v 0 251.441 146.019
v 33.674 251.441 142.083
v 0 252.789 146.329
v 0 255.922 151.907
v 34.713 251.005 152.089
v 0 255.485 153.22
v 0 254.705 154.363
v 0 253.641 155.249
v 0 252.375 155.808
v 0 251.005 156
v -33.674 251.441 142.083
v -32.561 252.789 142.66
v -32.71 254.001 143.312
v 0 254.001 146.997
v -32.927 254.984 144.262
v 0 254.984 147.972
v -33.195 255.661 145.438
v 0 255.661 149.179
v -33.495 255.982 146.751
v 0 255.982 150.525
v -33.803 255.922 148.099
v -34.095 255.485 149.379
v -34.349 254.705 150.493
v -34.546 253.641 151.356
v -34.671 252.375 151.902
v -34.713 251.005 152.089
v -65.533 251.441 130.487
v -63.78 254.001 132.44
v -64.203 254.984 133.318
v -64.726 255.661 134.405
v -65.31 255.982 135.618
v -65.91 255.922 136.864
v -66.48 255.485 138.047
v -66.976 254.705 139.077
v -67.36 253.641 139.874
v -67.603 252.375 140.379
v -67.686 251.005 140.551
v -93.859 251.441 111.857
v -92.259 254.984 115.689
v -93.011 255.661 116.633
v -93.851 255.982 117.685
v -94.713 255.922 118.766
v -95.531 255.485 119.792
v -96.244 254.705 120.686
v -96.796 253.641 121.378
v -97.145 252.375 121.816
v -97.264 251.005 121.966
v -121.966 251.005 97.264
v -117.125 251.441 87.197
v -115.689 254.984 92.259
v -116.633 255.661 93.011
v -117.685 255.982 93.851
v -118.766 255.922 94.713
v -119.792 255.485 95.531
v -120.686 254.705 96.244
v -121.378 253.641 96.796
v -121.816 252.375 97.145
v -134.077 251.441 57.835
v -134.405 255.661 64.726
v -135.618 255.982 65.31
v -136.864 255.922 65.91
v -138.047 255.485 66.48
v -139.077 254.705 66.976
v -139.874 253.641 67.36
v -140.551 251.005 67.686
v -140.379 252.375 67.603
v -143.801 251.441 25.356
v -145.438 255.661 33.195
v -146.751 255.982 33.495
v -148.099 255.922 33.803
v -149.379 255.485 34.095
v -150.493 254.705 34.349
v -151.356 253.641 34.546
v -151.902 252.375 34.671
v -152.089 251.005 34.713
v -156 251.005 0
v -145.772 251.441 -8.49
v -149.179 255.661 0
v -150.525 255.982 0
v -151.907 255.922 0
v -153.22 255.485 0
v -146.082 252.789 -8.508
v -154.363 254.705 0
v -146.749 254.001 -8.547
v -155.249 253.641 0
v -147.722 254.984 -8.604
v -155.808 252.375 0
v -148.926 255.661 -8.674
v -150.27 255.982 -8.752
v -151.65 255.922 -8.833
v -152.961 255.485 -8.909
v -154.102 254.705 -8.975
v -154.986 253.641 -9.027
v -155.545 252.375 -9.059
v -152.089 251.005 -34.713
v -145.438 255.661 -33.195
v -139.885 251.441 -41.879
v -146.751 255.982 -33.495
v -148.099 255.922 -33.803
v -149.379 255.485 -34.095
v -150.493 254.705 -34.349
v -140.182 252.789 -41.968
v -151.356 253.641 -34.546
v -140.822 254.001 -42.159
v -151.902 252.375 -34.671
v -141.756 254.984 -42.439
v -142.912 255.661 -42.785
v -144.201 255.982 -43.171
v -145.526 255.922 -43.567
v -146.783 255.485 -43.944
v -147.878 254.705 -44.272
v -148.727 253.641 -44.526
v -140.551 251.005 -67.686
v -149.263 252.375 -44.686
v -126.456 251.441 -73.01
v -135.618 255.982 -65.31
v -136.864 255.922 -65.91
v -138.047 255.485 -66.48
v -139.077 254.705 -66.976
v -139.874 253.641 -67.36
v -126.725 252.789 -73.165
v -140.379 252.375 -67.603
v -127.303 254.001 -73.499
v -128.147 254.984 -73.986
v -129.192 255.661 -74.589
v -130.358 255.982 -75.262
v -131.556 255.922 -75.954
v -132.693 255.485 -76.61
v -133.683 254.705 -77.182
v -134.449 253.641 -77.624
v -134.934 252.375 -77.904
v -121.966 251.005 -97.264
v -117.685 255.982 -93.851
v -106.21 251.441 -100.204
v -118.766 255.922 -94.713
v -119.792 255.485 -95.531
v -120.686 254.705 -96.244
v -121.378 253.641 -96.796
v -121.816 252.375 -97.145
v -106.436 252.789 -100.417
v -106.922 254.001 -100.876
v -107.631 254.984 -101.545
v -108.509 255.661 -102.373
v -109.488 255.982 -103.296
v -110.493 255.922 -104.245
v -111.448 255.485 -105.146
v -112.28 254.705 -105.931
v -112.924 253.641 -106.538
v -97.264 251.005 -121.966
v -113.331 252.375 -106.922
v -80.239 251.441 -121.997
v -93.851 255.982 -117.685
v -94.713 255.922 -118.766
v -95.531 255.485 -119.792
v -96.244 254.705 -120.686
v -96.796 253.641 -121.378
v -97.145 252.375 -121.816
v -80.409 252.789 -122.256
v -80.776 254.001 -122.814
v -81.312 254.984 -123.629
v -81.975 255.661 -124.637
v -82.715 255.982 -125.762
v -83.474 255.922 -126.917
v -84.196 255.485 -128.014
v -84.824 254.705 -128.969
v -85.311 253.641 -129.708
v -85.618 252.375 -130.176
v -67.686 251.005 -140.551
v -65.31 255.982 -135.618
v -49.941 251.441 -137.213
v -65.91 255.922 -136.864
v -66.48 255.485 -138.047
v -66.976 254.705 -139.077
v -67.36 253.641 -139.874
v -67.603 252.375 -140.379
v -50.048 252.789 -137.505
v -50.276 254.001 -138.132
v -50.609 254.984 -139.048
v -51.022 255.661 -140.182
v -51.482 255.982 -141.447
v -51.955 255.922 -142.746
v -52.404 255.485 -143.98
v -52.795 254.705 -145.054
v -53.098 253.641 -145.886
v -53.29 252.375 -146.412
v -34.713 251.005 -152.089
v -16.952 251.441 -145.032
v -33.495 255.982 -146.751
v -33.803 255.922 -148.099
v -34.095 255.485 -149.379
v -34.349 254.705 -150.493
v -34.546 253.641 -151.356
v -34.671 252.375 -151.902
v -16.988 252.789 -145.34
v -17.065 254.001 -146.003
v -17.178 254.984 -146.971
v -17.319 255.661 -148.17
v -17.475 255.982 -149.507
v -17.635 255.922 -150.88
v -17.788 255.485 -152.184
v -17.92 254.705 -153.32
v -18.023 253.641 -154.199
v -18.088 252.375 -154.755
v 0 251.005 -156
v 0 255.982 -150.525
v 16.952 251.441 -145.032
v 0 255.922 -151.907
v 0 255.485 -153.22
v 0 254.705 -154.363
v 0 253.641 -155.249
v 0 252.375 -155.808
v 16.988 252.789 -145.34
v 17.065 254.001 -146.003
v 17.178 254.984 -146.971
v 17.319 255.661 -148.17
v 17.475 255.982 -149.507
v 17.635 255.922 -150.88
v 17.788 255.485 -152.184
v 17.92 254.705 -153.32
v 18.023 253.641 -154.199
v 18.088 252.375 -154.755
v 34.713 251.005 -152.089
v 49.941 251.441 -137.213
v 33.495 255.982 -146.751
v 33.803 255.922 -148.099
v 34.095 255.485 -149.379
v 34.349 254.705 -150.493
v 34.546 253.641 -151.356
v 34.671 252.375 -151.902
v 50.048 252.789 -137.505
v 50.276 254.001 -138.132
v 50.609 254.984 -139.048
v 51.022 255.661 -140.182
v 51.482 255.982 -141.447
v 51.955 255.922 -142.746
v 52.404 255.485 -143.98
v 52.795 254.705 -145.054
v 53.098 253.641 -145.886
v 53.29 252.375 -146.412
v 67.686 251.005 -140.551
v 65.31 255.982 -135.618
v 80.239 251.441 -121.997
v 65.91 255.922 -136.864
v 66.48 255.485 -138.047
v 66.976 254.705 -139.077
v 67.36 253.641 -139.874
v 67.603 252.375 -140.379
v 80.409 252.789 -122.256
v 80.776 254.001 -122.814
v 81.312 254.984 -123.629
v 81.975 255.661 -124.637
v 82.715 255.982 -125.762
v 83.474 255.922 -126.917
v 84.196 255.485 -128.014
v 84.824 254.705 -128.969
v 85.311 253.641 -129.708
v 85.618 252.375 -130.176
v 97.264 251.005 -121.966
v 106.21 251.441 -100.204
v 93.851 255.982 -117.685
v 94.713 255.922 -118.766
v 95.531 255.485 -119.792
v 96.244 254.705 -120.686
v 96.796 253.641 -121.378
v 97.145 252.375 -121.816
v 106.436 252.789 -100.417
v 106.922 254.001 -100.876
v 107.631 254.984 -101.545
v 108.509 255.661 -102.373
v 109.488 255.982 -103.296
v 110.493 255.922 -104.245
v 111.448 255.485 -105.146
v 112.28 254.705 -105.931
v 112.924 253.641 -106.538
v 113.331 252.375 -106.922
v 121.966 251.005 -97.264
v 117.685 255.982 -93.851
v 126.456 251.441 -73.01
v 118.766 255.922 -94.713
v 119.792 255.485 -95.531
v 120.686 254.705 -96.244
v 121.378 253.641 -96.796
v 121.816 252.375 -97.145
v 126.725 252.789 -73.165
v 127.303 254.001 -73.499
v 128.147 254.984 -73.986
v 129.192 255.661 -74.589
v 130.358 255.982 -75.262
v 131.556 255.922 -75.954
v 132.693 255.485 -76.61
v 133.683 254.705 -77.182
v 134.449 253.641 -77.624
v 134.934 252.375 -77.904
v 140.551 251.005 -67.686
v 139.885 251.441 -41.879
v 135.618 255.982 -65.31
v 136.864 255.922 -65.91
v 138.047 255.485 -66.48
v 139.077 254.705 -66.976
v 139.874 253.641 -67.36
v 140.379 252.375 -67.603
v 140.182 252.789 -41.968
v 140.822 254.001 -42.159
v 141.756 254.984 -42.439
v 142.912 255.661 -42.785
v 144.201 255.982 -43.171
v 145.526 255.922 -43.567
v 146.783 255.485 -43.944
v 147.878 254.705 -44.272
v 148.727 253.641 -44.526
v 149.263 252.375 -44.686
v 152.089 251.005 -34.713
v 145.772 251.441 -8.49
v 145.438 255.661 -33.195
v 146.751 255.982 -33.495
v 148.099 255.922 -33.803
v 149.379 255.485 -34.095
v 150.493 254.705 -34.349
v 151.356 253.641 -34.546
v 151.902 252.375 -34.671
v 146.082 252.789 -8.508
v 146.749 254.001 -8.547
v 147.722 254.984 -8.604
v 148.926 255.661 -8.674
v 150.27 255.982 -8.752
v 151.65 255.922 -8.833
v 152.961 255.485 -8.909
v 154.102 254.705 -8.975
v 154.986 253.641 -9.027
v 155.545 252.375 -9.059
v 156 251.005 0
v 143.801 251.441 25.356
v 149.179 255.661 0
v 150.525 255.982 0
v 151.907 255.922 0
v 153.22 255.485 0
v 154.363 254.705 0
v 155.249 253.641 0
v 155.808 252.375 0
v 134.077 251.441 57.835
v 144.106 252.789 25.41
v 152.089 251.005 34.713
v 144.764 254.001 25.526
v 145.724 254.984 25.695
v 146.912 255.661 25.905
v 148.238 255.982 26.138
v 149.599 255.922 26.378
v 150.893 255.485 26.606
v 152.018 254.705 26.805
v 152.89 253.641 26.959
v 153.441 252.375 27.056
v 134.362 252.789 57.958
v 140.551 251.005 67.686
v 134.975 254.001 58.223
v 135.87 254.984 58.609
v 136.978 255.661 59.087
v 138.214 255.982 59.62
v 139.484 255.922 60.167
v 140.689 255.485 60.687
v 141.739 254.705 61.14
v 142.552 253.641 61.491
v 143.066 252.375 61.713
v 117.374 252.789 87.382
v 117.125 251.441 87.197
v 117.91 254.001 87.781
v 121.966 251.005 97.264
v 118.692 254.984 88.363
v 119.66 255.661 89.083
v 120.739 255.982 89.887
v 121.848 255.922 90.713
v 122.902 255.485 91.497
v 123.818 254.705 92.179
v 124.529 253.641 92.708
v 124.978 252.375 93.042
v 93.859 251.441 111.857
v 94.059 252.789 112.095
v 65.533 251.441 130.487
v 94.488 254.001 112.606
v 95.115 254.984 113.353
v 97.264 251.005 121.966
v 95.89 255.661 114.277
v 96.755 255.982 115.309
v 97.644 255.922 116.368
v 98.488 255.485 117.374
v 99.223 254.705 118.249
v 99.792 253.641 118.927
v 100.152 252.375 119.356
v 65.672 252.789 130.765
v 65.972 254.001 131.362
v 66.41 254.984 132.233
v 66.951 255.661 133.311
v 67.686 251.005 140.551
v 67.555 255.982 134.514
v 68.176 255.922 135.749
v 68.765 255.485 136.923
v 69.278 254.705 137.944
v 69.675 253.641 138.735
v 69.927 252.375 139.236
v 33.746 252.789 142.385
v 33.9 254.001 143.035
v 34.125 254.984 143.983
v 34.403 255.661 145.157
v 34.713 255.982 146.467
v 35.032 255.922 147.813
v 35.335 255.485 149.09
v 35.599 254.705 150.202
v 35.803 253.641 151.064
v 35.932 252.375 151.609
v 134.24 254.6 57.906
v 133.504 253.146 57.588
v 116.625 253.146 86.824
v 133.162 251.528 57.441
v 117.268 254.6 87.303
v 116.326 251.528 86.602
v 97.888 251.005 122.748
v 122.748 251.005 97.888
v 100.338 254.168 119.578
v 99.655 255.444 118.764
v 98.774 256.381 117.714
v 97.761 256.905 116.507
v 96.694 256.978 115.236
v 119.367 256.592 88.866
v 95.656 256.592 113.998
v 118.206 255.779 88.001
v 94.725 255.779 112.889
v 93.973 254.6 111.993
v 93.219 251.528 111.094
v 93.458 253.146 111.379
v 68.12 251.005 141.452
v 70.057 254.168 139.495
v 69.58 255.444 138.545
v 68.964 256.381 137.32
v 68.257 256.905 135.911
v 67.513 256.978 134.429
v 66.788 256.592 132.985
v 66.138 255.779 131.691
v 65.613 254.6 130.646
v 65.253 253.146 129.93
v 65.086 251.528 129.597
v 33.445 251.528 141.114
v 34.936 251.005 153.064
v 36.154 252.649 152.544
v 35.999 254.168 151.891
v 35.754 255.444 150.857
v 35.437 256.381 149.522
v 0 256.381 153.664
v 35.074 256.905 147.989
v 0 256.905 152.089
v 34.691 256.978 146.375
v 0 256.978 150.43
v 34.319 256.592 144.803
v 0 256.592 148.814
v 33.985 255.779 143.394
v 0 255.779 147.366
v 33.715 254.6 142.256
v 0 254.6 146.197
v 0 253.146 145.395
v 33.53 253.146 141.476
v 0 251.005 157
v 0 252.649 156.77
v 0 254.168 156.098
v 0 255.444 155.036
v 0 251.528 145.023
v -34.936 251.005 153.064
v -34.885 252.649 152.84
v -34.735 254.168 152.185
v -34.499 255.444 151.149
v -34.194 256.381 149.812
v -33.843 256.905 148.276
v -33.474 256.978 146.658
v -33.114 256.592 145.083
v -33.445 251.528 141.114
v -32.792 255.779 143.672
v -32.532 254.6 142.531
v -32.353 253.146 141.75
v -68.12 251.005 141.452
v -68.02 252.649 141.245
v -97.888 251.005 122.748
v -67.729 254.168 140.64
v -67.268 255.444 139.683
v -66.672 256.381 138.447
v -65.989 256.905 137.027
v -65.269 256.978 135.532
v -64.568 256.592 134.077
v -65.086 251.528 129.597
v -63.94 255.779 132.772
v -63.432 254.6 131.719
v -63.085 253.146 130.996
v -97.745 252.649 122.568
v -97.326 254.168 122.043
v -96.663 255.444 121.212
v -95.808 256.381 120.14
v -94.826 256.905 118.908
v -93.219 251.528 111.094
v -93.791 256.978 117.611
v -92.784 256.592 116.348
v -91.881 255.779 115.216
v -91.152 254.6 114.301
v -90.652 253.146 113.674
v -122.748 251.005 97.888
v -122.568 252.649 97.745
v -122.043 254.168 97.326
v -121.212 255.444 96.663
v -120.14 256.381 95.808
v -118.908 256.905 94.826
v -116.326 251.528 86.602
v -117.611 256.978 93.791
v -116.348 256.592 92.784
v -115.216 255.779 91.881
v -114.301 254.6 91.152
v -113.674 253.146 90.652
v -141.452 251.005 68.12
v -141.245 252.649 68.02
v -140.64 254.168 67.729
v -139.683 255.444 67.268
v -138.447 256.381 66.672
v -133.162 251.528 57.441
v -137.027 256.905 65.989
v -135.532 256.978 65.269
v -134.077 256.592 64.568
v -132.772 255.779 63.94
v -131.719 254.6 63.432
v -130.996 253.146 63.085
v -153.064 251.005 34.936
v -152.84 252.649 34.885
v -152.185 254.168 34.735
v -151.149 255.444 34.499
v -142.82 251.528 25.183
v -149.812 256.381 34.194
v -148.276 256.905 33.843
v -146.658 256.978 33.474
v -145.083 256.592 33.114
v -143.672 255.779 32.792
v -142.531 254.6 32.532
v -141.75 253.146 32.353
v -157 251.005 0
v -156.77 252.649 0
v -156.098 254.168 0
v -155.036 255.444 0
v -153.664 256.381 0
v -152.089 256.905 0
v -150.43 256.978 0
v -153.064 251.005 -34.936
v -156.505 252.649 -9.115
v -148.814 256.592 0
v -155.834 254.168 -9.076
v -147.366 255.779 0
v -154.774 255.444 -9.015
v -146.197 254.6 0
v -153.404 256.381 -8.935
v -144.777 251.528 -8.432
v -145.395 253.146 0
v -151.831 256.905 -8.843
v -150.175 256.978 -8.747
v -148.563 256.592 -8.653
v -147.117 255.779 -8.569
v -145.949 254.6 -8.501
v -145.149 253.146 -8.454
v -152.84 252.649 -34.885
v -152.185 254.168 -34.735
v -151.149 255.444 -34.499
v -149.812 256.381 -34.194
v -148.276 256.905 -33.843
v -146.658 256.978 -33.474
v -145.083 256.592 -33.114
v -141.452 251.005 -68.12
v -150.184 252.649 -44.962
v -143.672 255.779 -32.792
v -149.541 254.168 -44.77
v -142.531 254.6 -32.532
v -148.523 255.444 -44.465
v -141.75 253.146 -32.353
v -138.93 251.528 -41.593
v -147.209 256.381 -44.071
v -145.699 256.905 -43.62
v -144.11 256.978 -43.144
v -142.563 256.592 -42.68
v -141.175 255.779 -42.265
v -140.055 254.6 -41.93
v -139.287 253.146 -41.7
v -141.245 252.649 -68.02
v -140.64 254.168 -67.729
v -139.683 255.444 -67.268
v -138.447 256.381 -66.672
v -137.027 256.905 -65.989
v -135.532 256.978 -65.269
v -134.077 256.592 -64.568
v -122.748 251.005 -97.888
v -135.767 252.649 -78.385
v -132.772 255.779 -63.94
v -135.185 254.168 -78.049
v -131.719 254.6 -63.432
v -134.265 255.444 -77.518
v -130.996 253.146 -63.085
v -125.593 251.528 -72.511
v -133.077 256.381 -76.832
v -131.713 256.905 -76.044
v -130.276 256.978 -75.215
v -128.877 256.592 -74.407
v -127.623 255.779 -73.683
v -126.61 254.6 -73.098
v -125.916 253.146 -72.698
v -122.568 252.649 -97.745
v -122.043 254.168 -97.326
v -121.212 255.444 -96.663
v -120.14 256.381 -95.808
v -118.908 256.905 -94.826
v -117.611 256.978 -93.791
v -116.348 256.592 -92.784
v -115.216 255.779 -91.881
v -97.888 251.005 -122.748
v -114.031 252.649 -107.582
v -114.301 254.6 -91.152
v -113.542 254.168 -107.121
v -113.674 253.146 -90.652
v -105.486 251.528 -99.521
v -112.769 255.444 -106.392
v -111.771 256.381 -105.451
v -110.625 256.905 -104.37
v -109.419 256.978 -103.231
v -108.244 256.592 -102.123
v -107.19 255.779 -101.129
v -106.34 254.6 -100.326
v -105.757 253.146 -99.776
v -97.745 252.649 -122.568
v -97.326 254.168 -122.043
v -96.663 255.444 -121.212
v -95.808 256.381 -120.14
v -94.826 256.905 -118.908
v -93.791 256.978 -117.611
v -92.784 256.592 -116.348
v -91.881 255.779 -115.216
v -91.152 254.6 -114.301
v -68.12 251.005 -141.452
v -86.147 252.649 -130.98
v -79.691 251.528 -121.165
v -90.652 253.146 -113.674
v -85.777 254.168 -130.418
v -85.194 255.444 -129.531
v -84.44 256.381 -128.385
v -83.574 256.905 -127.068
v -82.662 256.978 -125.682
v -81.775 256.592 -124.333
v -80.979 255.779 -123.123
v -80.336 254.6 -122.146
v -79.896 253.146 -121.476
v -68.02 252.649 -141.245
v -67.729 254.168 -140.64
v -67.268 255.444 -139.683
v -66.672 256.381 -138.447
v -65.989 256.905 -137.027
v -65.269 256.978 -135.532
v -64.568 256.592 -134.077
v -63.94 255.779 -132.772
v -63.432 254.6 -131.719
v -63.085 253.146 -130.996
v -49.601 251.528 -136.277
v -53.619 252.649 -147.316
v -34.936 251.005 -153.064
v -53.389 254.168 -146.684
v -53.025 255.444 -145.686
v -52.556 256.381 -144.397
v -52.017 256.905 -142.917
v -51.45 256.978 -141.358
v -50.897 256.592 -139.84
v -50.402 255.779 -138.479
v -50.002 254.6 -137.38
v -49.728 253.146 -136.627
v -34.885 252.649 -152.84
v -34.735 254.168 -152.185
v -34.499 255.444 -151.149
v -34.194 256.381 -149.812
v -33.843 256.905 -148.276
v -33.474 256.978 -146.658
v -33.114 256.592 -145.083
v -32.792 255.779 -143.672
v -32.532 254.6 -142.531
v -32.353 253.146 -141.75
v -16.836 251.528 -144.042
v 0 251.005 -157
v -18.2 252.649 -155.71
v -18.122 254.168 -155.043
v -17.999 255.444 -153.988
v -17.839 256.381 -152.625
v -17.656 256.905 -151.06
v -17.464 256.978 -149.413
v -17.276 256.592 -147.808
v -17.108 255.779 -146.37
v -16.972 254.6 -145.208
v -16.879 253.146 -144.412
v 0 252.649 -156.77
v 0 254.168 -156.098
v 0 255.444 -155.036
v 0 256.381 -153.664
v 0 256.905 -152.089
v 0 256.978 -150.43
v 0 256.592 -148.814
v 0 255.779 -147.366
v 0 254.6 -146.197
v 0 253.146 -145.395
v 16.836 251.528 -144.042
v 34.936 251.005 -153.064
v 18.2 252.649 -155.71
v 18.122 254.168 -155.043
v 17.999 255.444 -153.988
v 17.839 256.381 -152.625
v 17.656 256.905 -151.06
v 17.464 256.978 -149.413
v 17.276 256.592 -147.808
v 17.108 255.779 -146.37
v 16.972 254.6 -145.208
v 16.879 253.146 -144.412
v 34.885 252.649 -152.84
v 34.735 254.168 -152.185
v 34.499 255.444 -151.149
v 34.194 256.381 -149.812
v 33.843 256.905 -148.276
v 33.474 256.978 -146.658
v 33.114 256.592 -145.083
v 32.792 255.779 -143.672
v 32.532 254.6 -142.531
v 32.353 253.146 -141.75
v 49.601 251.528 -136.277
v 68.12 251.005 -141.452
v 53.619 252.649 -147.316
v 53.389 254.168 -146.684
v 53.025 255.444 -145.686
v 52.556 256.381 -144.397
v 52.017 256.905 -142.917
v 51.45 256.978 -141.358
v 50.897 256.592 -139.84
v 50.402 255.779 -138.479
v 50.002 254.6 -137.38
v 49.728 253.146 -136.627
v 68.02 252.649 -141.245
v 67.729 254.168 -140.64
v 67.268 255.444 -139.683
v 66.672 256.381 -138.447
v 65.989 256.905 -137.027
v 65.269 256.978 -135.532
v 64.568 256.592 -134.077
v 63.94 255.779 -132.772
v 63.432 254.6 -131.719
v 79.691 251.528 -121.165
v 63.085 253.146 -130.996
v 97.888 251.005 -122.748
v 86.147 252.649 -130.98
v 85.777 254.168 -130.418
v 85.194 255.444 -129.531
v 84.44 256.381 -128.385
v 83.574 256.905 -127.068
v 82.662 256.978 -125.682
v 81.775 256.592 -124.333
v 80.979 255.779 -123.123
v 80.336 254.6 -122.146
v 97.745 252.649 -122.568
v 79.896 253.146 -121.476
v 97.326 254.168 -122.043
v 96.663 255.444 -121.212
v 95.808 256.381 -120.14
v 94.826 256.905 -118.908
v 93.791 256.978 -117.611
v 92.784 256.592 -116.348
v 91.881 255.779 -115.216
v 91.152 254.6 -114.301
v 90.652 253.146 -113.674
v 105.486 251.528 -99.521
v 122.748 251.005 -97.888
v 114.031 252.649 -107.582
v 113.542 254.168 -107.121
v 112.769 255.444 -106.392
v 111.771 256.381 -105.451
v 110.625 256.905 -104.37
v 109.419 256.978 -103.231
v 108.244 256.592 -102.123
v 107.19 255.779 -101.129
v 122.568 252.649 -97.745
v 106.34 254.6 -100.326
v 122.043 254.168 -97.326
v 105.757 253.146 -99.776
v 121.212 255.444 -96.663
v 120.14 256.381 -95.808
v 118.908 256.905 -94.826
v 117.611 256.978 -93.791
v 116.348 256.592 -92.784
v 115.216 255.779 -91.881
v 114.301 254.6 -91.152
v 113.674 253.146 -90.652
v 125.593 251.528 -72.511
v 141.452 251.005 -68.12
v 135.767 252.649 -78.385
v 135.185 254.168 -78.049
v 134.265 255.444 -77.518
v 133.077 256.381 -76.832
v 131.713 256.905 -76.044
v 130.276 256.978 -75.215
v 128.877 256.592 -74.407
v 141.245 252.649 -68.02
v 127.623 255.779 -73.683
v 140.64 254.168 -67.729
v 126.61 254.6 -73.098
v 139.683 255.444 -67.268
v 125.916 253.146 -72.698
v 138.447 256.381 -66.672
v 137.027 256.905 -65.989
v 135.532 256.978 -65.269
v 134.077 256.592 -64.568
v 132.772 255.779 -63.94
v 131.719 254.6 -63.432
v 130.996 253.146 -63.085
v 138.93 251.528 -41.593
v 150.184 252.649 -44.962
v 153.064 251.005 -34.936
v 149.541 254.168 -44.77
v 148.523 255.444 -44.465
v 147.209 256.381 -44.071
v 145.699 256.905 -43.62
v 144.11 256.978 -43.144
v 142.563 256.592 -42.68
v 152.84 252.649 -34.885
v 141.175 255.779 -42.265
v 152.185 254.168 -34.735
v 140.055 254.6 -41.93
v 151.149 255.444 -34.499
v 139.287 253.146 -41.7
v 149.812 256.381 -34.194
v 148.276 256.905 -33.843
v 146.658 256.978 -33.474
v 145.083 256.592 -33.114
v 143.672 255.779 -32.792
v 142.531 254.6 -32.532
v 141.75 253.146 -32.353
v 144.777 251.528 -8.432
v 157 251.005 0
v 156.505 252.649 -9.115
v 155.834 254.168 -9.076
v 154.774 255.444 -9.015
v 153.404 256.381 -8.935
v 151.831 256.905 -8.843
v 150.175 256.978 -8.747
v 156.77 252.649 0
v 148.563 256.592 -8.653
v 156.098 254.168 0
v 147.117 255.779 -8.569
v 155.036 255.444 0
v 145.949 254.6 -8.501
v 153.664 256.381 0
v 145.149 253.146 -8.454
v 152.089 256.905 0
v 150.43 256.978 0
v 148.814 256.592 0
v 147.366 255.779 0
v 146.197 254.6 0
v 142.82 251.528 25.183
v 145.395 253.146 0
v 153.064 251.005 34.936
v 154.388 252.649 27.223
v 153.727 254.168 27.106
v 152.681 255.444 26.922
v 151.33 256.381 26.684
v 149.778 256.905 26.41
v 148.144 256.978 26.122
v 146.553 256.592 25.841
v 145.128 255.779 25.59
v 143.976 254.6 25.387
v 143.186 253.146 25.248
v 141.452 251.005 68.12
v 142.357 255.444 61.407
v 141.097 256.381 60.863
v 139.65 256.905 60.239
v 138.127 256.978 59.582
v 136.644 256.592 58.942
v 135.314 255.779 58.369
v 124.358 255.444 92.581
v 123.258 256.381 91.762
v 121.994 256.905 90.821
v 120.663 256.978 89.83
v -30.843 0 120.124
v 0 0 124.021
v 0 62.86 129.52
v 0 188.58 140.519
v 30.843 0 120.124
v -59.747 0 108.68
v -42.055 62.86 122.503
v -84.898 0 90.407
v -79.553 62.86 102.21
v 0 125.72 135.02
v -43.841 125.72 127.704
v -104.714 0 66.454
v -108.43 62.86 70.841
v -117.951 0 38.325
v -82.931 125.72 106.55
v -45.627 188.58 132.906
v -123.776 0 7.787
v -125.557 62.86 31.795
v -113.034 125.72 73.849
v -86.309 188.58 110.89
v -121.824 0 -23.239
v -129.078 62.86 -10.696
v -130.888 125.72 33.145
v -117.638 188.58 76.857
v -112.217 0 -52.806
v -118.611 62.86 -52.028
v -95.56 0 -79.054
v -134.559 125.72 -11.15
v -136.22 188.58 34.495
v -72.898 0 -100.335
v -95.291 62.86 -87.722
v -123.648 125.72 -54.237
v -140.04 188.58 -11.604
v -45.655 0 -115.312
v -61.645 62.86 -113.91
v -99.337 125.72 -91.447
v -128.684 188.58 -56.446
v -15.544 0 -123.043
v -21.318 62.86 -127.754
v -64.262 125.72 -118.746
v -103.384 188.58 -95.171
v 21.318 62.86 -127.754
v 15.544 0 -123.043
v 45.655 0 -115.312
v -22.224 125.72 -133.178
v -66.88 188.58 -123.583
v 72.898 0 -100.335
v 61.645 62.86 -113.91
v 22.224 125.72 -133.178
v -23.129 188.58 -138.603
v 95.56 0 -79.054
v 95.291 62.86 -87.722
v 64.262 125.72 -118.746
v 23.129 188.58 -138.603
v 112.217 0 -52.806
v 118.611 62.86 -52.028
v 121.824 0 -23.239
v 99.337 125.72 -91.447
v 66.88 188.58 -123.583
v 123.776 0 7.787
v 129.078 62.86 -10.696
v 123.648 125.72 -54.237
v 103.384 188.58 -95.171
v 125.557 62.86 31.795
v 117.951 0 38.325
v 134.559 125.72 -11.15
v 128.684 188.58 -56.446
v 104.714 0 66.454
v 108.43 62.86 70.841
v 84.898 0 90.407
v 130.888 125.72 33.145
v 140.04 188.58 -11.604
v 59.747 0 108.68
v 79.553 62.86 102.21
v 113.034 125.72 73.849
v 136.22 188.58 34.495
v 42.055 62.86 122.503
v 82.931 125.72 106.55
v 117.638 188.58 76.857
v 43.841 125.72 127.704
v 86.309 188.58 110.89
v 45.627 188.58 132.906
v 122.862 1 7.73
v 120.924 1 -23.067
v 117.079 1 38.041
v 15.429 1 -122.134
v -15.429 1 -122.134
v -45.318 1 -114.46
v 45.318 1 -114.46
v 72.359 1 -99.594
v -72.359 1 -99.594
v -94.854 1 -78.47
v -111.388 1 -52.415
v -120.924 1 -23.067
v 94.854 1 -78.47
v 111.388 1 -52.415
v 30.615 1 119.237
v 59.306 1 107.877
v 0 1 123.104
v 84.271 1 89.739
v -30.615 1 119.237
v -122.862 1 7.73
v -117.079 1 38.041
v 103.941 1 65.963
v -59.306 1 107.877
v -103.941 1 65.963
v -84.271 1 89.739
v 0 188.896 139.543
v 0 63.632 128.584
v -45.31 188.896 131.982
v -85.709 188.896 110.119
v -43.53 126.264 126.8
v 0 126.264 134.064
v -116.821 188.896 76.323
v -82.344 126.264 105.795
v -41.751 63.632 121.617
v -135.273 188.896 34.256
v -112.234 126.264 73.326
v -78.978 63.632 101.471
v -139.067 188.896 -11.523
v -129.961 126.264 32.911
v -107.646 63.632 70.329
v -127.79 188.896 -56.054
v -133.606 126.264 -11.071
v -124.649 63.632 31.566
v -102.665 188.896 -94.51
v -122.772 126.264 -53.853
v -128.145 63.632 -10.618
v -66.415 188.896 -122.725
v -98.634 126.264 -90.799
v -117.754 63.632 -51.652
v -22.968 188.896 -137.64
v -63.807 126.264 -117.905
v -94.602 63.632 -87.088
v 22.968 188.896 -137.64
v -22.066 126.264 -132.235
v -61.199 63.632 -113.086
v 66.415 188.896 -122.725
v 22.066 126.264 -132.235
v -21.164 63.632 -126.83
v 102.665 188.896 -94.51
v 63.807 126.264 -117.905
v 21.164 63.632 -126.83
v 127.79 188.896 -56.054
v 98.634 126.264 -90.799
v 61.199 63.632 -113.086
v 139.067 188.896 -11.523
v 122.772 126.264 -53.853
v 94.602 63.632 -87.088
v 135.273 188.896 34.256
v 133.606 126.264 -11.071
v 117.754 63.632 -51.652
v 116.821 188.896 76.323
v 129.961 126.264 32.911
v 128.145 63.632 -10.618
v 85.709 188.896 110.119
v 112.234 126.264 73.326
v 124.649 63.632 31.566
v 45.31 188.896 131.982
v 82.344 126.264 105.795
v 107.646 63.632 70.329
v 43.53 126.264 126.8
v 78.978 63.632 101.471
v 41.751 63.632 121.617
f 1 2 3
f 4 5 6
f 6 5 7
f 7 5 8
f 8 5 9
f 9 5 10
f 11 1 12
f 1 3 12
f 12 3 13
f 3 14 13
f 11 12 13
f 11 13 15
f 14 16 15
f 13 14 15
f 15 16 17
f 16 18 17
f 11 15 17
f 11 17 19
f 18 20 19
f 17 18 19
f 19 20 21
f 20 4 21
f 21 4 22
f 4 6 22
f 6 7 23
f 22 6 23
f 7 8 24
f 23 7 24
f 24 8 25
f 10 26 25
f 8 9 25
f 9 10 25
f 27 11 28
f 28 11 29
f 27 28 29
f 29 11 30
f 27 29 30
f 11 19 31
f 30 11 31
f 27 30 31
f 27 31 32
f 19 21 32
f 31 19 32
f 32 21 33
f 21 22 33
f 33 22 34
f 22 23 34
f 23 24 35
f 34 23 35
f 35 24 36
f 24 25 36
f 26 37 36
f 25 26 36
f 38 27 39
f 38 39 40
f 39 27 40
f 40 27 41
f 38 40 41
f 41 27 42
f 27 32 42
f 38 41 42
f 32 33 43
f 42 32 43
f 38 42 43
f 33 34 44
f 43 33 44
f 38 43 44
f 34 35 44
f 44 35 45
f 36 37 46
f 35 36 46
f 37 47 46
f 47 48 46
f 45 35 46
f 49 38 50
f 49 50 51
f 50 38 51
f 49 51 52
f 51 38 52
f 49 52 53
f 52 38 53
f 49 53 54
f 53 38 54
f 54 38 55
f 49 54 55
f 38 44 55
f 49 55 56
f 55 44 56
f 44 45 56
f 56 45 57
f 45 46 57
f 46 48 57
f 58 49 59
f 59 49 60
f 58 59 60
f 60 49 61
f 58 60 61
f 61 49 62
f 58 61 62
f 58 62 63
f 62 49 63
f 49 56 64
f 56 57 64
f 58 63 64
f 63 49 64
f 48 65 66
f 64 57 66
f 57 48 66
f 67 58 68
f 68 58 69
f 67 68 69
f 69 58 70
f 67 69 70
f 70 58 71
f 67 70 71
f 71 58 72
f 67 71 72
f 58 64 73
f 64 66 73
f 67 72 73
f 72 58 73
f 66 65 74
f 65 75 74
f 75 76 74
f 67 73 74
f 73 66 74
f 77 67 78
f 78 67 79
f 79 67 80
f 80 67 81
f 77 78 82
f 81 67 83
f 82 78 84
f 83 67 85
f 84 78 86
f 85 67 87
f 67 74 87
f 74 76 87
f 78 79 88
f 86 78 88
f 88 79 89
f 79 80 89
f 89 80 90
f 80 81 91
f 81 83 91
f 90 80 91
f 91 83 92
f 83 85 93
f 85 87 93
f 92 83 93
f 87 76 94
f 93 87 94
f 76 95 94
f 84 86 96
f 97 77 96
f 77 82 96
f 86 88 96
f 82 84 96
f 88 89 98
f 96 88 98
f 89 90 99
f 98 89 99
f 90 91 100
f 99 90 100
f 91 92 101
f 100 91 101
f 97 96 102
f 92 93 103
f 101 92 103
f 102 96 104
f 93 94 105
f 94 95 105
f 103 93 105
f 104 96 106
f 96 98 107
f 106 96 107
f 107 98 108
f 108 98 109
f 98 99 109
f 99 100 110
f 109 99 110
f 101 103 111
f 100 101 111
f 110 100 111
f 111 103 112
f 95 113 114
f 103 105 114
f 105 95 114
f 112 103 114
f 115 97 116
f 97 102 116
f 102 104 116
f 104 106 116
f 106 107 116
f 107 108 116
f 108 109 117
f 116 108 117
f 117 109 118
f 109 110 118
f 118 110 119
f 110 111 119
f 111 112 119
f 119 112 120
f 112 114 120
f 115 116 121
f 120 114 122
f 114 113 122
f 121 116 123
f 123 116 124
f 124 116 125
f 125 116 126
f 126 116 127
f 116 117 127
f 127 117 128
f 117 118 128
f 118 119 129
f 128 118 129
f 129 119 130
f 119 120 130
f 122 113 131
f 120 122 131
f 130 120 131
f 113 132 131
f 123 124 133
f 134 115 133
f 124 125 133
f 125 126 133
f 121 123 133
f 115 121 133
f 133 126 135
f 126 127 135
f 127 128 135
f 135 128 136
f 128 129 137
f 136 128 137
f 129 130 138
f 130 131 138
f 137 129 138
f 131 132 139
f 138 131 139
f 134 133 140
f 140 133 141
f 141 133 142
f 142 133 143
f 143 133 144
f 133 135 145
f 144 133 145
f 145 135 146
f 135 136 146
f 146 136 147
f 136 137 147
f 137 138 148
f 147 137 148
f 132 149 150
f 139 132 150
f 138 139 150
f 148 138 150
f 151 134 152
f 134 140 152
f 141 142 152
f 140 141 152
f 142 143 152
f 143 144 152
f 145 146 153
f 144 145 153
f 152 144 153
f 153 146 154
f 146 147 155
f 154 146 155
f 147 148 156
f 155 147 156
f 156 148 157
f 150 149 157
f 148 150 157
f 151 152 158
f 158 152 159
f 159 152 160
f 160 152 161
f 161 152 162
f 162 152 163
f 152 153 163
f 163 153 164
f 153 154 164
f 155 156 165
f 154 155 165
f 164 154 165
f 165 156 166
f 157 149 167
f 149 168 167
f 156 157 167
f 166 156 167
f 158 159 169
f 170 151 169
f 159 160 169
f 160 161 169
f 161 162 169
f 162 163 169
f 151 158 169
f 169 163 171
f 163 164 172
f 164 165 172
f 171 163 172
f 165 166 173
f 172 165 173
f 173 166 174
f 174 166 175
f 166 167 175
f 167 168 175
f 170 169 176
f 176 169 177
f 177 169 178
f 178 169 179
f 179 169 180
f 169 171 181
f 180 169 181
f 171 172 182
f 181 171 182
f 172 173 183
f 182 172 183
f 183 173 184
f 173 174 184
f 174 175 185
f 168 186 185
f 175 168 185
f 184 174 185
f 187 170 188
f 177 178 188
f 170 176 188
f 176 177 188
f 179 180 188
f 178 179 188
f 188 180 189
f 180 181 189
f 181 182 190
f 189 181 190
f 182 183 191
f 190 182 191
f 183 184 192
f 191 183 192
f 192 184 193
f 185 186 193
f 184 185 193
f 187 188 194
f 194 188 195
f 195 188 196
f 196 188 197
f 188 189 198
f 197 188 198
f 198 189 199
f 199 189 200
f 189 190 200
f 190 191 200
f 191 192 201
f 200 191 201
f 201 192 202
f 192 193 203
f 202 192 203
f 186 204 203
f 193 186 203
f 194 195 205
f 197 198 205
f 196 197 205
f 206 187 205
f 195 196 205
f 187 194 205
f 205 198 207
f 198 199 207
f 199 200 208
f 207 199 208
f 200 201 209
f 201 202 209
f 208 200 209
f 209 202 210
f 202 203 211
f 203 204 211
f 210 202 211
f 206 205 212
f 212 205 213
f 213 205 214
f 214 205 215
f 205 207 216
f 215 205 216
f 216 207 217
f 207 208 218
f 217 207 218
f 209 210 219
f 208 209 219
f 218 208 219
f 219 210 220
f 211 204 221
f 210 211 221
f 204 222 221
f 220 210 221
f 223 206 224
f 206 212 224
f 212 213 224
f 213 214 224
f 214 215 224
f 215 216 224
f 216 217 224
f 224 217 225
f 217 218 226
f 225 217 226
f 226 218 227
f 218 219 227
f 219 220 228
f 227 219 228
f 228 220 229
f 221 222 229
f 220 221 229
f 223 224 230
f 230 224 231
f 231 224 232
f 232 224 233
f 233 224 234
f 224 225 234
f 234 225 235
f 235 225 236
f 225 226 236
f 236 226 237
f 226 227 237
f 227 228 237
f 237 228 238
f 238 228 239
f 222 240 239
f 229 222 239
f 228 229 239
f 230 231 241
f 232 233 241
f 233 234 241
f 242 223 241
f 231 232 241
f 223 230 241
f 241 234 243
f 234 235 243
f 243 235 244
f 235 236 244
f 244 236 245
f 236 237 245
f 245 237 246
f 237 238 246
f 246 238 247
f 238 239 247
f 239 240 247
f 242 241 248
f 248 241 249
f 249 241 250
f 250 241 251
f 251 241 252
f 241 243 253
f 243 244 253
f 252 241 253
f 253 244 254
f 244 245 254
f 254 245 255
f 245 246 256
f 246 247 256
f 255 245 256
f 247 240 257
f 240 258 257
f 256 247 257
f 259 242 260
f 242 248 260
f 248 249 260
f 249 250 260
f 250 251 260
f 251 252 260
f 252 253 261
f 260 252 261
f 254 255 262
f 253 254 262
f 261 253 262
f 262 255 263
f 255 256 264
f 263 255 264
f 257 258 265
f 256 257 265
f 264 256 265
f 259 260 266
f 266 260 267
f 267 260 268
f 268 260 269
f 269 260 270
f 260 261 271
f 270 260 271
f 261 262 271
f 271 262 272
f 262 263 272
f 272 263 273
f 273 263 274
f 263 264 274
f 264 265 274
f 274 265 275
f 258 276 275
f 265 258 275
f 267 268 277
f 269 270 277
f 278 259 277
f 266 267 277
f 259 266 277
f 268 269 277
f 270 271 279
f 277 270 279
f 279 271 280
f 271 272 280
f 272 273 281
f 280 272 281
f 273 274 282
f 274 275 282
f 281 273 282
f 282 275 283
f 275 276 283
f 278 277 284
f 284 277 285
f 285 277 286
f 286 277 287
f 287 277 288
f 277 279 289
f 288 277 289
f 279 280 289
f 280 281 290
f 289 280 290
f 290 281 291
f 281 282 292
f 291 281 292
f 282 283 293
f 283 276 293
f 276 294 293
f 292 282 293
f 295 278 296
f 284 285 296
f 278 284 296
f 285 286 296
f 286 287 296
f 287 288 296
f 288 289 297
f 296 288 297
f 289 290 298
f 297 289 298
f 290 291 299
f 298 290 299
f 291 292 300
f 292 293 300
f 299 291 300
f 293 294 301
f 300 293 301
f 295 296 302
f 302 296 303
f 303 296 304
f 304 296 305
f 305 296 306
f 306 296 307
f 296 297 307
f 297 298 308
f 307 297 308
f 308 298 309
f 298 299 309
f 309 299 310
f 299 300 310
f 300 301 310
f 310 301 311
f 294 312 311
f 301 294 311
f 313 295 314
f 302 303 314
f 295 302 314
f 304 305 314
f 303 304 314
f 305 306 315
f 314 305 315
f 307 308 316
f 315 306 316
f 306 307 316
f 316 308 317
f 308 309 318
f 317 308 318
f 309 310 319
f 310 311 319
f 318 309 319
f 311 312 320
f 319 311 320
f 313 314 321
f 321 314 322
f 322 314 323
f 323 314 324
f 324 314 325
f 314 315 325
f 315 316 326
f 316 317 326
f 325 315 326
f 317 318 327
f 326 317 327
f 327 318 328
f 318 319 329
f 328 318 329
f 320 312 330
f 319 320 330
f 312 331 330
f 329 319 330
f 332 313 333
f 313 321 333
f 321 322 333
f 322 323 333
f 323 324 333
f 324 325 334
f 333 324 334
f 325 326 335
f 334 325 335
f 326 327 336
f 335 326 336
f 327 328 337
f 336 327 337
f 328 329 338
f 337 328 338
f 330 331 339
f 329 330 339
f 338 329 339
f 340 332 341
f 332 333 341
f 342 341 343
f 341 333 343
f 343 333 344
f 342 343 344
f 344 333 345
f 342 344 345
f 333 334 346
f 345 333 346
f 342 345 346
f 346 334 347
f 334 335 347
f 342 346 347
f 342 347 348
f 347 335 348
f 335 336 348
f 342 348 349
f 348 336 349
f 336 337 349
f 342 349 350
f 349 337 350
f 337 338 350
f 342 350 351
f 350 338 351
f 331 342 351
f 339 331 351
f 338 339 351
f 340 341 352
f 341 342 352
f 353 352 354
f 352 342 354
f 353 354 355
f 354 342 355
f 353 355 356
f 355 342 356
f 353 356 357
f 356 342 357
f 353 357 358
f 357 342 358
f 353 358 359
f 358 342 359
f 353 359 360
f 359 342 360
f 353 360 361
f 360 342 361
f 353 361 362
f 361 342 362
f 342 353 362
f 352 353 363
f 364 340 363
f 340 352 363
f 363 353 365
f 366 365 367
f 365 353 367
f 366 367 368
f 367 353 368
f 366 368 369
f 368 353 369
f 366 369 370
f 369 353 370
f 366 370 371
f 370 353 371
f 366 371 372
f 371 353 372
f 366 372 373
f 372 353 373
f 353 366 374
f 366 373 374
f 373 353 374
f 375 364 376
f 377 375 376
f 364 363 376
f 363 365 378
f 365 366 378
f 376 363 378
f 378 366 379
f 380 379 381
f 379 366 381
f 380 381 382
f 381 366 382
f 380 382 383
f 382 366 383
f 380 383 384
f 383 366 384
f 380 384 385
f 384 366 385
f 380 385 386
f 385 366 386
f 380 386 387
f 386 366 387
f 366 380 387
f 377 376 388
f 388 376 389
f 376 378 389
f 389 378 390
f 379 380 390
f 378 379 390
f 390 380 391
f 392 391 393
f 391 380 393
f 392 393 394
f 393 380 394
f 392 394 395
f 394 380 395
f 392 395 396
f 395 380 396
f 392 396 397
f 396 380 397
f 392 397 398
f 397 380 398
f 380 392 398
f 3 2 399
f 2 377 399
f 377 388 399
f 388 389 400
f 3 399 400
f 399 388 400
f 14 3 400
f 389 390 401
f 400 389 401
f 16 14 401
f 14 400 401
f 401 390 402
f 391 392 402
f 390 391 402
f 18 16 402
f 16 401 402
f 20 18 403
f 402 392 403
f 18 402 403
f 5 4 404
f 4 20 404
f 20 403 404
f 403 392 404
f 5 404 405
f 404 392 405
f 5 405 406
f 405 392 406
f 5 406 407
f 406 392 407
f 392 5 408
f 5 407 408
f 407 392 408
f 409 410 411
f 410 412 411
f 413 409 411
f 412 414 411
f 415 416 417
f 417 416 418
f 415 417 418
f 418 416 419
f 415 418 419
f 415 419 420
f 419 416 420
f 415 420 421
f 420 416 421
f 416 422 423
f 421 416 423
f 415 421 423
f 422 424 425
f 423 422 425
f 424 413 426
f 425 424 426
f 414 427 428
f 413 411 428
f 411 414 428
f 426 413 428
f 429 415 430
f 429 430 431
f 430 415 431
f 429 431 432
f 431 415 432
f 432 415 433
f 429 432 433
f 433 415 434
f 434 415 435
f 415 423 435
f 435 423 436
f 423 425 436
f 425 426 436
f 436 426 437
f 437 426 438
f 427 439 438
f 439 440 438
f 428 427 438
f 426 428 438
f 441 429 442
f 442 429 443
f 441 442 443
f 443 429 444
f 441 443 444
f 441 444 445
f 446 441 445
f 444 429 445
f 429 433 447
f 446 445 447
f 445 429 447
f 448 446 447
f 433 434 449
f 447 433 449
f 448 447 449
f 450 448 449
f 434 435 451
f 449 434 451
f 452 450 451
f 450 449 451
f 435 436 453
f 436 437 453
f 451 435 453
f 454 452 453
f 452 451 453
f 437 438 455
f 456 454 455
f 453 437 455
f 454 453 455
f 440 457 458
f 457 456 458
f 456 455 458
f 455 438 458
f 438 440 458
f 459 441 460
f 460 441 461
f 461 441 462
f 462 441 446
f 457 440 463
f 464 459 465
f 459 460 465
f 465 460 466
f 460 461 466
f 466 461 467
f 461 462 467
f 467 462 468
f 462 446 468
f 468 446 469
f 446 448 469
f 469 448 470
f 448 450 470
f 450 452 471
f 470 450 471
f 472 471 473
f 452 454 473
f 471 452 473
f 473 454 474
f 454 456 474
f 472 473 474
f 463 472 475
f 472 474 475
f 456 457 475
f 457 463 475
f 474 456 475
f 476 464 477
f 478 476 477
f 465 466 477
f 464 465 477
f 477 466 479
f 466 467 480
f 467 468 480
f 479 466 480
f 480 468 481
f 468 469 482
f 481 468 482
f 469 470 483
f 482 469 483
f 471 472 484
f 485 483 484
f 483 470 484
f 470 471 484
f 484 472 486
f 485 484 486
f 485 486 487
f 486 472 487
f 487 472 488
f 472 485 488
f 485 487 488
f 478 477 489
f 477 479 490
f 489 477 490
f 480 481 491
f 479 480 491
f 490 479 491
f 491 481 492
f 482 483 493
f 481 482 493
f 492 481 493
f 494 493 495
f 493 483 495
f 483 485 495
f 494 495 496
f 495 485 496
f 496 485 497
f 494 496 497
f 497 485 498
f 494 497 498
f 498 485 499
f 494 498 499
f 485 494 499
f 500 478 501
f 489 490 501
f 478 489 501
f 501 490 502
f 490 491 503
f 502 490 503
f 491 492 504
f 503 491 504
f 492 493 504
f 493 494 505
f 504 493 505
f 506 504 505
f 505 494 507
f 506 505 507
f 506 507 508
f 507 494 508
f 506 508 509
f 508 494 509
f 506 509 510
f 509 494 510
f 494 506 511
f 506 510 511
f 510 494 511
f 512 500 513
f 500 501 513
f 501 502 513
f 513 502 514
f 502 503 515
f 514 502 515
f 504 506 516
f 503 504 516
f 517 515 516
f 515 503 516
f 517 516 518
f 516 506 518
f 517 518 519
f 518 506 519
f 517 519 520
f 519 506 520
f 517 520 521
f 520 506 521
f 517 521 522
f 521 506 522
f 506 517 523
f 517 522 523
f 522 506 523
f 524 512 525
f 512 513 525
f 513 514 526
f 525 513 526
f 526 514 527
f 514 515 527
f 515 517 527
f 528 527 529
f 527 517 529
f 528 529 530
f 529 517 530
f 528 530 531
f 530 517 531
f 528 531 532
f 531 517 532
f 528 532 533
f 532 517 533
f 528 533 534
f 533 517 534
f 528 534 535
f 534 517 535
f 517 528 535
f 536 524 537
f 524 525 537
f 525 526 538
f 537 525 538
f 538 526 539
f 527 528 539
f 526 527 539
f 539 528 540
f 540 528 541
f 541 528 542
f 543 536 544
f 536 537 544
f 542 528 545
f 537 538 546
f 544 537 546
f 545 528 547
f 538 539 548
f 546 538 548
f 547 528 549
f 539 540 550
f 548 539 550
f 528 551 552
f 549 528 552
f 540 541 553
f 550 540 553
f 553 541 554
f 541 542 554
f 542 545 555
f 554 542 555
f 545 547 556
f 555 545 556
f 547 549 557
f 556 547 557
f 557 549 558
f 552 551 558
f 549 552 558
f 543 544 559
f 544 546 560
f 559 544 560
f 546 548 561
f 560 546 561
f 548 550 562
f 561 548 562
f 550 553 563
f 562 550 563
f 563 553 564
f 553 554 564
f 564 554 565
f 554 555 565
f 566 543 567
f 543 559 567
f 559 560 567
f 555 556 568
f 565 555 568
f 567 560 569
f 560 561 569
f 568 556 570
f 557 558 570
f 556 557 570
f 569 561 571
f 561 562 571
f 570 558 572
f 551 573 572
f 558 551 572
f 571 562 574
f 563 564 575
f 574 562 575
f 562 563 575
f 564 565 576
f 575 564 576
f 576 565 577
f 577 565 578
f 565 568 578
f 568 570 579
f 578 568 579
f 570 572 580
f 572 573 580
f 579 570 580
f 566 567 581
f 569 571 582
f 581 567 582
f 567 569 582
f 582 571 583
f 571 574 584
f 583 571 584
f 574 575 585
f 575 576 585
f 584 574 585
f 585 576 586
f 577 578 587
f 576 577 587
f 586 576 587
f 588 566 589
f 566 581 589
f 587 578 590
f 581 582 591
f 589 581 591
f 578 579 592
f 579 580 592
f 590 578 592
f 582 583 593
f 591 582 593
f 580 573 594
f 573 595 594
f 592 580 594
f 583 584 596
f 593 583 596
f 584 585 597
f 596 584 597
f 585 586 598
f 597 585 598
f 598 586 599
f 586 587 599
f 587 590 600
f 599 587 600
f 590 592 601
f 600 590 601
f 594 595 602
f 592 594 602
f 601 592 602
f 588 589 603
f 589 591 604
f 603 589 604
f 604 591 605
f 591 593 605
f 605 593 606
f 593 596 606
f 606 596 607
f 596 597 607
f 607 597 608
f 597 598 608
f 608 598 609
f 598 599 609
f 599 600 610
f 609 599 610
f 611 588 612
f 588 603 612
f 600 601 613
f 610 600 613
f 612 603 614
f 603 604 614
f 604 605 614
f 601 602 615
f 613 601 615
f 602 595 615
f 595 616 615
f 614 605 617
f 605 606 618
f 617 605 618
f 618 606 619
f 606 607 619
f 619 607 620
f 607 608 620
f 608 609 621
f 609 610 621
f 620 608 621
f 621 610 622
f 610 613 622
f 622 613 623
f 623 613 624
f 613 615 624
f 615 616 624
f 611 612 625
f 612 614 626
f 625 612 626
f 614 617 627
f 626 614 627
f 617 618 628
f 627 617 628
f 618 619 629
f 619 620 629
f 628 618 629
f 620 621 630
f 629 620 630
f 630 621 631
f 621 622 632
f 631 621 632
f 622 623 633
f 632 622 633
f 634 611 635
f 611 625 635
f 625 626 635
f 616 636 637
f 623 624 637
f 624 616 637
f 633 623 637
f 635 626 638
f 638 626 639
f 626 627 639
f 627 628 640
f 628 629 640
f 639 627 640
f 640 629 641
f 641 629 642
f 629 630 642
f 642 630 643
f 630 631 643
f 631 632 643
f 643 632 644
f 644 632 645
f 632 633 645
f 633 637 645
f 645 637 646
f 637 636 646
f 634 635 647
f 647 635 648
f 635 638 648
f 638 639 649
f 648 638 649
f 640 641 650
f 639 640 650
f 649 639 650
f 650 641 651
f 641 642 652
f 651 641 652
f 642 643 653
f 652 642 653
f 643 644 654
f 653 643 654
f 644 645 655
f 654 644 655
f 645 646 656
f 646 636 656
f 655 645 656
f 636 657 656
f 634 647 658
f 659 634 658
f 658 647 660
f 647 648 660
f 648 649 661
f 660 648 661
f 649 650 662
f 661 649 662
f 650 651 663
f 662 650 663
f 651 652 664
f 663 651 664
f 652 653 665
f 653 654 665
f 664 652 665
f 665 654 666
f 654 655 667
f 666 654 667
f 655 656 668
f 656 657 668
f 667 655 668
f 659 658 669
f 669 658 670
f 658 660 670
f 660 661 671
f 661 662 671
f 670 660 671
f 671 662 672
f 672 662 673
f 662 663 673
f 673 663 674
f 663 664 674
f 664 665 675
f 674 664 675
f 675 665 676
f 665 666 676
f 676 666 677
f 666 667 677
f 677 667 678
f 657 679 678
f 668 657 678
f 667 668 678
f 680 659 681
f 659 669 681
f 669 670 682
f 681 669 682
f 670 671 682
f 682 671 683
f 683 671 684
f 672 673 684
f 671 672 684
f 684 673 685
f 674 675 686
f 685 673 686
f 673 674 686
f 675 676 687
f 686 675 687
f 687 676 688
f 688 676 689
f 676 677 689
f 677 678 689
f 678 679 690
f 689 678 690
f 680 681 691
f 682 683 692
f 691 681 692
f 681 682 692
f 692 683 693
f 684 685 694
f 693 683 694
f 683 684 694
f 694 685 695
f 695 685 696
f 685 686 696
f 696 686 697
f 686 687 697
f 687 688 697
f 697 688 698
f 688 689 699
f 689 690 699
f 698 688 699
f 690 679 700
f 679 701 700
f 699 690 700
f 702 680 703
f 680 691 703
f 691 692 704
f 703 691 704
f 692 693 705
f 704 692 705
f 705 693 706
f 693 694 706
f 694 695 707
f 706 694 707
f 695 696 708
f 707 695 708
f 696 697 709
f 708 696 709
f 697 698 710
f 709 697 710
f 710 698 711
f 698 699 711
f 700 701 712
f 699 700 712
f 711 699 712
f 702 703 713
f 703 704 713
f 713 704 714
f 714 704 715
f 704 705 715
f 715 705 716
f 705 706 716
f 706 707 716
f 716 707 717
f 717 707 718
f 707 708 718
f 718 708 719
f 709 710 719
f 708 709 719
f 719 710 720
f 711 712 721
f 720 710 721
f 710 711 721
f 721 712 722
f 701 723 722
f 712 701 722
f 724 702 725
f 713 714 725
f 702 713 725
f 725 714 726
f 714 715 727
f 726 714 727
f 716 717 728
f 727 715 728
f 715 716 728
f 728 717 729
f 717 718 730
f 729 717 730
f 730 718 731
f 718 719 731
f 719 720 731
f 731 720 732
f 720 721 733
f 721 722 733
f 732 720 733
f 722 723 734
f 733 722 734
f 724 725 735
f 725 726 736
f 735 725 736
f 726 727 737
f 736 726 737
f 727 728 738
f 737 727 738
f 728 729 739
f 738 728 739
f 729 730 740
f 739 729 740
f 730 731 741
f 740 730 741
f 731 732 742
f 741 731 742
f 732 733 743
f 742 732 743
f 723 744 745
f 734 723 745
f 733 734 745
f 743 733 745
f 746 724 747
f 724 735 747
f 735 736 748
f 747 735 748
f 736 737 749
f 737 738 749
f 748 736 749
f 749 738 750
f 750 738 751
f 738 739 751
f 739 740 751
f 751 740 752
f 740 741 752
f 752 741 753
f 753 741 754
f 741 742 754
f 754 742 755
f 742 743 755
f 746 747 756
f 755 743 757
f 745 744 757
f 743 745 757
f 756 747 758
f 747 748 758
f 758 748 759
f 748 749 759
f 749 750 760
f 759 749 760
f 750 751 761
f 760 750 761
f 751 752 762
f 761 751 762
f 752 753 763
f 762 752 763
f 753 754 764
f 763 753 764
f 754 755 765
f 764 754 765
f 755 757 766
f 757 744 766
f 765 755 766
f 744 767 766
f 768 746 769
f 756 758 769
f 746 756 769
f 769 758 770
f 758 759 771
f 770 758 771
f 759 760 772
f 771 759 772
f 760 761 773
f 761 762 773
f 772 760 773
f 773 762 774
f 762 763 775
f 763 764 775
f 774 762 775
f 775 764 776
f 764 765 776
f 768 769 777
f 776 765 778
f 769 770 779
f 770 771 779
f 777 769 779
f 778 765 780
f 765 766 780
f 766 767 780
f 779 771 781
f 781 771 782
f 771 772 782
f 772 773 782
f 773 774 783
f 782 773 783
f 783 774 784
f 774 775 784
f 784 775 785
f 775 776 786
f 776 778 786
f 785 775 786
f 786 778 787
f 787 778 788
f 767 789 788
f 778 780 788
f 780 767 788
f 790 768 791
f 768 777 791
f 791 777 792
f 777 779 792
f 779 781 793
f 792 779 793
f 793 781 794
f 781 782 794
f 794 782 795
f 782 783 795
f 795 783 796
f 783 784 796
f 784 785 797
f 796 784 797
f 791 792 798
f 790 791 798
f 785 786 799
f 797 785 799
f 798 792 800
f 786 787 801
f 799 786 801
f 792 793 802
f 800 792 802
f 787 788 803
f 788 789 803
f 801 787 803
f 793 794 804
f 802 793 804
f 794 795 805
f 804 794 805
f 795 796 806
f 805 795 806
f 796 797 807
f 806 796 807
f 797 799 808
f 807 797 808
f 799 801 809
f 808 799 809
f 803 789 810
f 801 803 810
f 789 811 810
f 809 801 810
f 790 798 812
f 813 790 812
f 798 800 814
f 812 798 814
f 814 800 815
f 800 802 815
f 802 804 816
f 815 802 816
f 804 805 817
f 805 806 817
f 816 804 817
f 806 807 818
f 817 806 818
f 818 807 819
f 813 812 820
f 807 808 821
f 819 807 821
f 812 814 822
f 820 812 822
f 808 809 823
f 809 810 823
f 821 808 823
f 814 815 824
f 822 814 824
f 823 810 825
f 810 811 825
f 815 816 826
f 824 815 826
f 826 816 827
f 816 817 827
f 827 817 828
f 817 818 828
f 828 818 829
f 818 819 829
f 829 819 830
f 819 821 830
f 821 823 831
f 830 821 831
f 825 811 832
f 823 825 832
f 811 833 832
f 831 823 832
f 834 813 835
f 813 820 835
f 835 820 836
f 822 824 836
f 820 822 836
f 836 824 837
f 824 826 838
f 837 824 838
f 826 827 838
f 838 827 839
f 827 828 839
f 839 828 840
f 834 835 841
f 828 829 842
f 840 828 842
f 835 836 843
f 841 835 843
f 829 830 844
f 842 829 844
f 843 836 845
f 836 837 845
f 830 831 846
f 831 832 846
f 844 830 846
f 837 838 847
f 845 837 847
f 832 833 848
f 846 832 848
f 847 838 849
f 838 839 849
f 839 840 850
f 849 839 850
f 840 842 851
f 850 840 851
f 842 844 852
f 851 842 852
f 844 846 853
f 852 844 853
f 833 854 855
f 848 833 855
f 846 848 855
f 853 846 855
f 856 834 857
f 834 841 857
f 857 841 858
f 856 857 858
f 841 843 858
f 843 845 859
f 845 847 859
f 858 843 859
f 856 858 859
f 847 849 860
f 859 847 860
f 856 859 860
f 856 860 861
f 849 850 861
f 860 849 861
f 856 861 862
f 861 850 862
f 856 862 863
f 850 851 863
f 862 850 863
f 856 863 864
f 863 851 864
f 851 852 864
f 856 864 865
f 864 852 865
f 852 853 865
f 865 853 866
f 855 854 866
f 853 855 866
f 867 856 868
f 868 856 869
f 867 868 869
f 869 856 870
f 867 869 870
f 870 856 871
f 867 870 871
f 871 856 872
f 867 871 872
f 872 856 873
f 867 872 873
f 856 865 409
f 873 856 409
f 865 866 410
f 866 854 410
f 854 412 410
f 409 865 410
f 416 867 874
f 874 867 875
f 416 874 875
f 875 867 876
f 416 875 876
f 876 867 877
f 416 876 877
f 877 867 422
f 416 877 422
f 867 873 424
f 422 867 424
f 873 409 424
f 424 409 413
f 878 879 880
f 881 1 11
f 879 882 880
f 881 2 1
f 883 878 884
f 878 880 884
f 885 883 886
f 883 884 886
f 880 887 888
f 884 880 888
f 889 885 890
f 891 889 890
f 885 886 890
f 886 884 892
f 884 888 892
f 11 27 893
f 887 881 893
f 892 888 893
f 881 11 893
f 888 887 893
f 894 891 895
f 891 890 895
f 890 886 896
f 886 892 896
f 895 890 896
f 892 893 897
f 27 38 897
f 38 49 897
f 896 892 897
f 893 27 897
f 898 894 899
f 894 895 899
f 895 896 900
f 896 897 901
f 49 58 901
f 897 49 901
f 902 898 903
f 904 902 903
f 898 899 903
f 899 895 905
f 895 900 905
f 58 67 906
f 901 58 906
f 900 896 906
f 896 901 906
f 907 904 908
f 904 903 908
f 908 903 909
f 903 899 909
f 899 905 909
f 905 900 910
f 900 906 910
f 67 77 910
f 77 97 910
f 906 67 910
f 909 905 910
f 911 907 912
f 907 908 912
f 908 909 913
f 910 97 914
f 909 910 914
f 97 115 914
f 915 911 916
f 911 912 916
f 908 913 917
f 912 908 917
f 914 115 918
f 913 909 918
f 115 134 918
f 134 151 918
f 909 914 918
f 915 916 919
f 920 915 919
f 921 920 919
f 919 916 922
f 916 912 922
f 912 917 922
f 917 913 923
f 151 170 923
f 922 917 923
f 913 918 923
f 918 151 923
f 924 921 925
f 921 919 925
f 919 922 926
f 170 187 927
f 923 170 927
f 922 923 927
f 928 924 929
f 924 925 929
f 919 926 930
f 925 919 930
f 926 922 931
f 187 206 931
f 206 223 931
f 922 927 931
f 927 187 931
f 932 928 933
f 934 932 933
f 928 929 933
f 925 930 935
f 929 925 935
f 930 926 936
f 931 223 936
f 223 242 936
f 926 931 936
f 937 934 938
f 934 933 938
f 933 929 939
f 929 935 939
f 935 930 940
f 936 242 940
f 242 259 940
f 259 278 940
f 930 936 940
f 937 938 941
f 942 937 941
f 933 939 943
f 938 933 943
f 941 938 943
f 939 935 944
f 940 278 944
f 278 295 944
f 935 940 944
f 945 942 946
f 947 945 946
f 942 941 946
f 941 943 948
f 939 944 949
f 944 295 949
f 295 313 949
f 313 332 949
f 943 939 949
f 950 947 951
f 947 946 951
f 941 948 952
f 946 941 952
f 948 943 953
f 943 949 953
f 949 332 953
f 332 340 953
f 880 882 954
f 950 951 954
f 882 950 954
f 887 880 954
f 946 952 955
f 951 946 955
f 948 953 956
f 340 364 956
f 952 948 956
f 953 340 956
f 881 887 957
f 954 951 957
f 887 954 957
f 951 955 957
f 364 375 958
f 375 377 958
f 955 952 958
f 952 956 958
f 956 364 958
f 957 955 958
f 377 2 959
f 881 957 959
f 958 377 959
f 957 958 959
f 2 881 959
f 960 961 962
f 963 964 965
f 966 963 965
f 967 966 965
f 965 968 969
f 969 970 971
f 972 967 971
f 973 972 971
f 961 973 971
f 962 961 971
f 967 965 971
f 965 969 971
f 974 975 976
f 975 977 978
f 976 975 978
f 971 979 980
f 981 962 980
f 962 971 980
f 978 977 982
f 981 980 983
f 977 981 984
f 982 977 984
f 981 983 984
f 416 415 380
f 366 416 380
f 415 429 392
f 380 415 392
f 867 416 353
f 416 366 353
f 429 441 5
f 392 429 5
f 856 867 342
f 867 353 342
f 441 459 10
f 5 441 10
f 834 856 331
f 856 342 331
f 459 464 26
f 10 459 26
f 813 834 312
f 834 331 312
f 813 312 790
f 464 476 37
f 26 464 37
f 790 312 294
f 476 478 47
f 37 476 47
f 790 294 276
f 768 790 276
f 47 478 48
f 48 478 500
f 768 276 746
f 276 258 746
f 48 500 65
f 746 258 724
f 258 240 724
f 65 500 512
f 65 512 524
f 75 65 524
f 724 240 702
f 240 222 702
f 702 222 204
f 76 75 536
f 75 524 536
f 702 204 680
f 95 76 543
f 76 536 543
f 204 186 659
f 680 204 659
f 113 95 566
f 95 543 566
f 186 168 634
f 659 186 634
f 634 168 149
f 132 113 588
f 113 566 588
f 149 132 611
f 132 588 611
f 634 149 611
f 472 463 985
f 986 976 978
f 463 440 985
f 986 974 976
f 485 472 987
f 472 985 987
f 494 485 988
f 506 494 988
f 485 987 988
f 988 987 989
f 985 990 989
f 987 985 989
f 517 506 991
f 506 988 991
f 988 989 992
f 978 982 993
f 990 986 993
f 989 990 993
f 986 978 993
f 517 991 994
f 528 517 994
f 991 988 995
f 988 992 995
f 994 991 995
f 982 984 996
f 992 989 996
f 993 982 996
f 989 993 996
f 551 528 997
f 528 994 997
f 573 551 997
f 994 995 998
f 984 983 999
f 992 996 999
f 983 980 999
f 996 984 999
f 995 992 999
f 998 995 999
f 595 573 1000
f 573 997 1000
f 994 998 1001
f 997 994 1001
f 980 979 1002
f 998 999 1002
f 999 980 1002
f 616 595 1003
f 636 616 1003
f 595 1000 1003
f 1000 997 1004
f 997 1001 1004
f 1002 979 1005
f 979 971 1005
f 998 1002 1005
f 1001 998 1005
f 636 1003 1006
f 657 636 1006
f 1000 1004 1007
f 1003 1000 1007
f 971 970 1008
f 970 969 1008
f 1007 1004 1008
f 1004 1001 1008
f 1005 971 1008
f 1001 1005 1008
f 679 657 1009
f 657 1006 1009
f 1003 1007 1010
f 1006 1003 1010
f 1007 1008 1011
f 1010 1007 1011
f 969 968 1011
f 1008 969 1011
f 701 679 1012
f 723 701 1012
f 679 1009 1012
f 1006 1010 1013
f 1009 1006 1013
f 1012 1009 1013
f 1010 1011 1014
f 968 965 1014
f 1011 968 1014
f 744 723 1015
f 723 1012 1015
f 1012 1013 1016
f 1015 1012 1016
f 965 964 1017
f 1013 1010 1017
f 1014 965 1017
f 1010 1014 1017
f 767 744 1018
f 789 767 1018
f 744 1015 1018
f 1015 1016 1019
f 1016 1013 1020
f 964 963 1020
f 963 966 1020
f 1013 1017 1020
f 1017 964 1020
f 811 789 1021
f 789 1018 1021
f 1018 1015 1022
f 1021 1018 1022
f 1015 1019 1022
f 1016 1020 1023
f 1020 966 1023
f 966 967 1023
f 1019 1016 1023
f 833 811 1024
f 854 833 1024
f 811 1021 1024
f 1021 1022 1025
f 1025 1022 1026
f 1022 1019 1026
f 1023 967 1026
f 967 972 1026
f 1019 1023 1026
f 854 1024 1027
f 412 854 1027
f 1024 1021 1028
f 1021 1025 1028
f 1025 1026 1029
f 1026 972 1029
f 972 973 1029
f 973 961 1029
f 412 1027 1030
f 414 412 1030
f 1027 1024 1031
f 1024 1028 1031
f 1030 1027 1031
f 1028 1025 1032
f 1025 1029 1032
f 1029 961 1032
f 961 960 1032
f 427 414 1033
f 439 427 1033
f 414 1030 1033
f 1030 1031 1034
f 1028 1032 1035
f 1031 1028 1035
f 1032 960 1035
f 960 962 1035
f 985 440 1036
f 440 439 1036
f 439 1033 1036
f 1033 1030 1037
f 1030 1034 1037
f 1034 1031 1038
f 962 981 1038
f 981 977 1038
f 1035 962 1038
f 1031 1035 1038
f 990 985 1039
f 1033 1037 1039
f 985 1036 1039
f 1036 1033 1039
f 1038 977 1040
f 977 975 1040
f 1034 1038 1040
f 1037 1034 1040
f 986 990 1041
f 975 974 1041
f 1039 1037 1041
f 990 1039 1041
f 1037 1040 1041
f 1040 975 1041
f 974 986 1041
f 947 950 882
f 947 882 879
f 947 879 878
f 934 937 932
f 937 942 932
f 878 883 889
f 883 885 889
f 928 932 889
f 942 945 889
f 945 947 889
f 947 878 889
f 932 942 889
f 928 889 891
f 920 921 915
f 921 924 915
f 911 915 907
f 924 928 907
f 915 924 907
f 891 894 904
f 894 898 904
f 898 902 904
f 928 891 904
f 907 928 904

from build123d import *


with BuildPart() as part:
    # ｽｹｯﾁ1 → 回転1 (revolve)
    with BuildSketch(Plane.XY, mode=Mode.PRIVATE) as revolve_1_sk:
        with BuildLine():
            Line((0, 0), (124.020829918, 0))
            Line((124.020829918, 0), (146.01902651, 251.440537606))
            ThreePointArc((146.01902651, 251.440537606), (151.218096937, 256), (156, 251.004758892))
            Line((156, 251.004758892), (157, 251.004758892))
            ThreePointArc((157, 251.004758892), (151.261716324, 256.999048222), (145.022831811, 251.527693349))
            Line((145.022831811, 251.527693349), (123.104498744, 1))
            Line((123.104498744, 1), (0, 1))
            Line((0, 1), (0, 0))
        make_face()
    revolve(revolve_1_sk.sketch.rotate(Axis((0, 1, 0), (0, -1, 0)), 90), axis=Axis((0, 1, 0), (0, -1, 0)))


solid = part.part
